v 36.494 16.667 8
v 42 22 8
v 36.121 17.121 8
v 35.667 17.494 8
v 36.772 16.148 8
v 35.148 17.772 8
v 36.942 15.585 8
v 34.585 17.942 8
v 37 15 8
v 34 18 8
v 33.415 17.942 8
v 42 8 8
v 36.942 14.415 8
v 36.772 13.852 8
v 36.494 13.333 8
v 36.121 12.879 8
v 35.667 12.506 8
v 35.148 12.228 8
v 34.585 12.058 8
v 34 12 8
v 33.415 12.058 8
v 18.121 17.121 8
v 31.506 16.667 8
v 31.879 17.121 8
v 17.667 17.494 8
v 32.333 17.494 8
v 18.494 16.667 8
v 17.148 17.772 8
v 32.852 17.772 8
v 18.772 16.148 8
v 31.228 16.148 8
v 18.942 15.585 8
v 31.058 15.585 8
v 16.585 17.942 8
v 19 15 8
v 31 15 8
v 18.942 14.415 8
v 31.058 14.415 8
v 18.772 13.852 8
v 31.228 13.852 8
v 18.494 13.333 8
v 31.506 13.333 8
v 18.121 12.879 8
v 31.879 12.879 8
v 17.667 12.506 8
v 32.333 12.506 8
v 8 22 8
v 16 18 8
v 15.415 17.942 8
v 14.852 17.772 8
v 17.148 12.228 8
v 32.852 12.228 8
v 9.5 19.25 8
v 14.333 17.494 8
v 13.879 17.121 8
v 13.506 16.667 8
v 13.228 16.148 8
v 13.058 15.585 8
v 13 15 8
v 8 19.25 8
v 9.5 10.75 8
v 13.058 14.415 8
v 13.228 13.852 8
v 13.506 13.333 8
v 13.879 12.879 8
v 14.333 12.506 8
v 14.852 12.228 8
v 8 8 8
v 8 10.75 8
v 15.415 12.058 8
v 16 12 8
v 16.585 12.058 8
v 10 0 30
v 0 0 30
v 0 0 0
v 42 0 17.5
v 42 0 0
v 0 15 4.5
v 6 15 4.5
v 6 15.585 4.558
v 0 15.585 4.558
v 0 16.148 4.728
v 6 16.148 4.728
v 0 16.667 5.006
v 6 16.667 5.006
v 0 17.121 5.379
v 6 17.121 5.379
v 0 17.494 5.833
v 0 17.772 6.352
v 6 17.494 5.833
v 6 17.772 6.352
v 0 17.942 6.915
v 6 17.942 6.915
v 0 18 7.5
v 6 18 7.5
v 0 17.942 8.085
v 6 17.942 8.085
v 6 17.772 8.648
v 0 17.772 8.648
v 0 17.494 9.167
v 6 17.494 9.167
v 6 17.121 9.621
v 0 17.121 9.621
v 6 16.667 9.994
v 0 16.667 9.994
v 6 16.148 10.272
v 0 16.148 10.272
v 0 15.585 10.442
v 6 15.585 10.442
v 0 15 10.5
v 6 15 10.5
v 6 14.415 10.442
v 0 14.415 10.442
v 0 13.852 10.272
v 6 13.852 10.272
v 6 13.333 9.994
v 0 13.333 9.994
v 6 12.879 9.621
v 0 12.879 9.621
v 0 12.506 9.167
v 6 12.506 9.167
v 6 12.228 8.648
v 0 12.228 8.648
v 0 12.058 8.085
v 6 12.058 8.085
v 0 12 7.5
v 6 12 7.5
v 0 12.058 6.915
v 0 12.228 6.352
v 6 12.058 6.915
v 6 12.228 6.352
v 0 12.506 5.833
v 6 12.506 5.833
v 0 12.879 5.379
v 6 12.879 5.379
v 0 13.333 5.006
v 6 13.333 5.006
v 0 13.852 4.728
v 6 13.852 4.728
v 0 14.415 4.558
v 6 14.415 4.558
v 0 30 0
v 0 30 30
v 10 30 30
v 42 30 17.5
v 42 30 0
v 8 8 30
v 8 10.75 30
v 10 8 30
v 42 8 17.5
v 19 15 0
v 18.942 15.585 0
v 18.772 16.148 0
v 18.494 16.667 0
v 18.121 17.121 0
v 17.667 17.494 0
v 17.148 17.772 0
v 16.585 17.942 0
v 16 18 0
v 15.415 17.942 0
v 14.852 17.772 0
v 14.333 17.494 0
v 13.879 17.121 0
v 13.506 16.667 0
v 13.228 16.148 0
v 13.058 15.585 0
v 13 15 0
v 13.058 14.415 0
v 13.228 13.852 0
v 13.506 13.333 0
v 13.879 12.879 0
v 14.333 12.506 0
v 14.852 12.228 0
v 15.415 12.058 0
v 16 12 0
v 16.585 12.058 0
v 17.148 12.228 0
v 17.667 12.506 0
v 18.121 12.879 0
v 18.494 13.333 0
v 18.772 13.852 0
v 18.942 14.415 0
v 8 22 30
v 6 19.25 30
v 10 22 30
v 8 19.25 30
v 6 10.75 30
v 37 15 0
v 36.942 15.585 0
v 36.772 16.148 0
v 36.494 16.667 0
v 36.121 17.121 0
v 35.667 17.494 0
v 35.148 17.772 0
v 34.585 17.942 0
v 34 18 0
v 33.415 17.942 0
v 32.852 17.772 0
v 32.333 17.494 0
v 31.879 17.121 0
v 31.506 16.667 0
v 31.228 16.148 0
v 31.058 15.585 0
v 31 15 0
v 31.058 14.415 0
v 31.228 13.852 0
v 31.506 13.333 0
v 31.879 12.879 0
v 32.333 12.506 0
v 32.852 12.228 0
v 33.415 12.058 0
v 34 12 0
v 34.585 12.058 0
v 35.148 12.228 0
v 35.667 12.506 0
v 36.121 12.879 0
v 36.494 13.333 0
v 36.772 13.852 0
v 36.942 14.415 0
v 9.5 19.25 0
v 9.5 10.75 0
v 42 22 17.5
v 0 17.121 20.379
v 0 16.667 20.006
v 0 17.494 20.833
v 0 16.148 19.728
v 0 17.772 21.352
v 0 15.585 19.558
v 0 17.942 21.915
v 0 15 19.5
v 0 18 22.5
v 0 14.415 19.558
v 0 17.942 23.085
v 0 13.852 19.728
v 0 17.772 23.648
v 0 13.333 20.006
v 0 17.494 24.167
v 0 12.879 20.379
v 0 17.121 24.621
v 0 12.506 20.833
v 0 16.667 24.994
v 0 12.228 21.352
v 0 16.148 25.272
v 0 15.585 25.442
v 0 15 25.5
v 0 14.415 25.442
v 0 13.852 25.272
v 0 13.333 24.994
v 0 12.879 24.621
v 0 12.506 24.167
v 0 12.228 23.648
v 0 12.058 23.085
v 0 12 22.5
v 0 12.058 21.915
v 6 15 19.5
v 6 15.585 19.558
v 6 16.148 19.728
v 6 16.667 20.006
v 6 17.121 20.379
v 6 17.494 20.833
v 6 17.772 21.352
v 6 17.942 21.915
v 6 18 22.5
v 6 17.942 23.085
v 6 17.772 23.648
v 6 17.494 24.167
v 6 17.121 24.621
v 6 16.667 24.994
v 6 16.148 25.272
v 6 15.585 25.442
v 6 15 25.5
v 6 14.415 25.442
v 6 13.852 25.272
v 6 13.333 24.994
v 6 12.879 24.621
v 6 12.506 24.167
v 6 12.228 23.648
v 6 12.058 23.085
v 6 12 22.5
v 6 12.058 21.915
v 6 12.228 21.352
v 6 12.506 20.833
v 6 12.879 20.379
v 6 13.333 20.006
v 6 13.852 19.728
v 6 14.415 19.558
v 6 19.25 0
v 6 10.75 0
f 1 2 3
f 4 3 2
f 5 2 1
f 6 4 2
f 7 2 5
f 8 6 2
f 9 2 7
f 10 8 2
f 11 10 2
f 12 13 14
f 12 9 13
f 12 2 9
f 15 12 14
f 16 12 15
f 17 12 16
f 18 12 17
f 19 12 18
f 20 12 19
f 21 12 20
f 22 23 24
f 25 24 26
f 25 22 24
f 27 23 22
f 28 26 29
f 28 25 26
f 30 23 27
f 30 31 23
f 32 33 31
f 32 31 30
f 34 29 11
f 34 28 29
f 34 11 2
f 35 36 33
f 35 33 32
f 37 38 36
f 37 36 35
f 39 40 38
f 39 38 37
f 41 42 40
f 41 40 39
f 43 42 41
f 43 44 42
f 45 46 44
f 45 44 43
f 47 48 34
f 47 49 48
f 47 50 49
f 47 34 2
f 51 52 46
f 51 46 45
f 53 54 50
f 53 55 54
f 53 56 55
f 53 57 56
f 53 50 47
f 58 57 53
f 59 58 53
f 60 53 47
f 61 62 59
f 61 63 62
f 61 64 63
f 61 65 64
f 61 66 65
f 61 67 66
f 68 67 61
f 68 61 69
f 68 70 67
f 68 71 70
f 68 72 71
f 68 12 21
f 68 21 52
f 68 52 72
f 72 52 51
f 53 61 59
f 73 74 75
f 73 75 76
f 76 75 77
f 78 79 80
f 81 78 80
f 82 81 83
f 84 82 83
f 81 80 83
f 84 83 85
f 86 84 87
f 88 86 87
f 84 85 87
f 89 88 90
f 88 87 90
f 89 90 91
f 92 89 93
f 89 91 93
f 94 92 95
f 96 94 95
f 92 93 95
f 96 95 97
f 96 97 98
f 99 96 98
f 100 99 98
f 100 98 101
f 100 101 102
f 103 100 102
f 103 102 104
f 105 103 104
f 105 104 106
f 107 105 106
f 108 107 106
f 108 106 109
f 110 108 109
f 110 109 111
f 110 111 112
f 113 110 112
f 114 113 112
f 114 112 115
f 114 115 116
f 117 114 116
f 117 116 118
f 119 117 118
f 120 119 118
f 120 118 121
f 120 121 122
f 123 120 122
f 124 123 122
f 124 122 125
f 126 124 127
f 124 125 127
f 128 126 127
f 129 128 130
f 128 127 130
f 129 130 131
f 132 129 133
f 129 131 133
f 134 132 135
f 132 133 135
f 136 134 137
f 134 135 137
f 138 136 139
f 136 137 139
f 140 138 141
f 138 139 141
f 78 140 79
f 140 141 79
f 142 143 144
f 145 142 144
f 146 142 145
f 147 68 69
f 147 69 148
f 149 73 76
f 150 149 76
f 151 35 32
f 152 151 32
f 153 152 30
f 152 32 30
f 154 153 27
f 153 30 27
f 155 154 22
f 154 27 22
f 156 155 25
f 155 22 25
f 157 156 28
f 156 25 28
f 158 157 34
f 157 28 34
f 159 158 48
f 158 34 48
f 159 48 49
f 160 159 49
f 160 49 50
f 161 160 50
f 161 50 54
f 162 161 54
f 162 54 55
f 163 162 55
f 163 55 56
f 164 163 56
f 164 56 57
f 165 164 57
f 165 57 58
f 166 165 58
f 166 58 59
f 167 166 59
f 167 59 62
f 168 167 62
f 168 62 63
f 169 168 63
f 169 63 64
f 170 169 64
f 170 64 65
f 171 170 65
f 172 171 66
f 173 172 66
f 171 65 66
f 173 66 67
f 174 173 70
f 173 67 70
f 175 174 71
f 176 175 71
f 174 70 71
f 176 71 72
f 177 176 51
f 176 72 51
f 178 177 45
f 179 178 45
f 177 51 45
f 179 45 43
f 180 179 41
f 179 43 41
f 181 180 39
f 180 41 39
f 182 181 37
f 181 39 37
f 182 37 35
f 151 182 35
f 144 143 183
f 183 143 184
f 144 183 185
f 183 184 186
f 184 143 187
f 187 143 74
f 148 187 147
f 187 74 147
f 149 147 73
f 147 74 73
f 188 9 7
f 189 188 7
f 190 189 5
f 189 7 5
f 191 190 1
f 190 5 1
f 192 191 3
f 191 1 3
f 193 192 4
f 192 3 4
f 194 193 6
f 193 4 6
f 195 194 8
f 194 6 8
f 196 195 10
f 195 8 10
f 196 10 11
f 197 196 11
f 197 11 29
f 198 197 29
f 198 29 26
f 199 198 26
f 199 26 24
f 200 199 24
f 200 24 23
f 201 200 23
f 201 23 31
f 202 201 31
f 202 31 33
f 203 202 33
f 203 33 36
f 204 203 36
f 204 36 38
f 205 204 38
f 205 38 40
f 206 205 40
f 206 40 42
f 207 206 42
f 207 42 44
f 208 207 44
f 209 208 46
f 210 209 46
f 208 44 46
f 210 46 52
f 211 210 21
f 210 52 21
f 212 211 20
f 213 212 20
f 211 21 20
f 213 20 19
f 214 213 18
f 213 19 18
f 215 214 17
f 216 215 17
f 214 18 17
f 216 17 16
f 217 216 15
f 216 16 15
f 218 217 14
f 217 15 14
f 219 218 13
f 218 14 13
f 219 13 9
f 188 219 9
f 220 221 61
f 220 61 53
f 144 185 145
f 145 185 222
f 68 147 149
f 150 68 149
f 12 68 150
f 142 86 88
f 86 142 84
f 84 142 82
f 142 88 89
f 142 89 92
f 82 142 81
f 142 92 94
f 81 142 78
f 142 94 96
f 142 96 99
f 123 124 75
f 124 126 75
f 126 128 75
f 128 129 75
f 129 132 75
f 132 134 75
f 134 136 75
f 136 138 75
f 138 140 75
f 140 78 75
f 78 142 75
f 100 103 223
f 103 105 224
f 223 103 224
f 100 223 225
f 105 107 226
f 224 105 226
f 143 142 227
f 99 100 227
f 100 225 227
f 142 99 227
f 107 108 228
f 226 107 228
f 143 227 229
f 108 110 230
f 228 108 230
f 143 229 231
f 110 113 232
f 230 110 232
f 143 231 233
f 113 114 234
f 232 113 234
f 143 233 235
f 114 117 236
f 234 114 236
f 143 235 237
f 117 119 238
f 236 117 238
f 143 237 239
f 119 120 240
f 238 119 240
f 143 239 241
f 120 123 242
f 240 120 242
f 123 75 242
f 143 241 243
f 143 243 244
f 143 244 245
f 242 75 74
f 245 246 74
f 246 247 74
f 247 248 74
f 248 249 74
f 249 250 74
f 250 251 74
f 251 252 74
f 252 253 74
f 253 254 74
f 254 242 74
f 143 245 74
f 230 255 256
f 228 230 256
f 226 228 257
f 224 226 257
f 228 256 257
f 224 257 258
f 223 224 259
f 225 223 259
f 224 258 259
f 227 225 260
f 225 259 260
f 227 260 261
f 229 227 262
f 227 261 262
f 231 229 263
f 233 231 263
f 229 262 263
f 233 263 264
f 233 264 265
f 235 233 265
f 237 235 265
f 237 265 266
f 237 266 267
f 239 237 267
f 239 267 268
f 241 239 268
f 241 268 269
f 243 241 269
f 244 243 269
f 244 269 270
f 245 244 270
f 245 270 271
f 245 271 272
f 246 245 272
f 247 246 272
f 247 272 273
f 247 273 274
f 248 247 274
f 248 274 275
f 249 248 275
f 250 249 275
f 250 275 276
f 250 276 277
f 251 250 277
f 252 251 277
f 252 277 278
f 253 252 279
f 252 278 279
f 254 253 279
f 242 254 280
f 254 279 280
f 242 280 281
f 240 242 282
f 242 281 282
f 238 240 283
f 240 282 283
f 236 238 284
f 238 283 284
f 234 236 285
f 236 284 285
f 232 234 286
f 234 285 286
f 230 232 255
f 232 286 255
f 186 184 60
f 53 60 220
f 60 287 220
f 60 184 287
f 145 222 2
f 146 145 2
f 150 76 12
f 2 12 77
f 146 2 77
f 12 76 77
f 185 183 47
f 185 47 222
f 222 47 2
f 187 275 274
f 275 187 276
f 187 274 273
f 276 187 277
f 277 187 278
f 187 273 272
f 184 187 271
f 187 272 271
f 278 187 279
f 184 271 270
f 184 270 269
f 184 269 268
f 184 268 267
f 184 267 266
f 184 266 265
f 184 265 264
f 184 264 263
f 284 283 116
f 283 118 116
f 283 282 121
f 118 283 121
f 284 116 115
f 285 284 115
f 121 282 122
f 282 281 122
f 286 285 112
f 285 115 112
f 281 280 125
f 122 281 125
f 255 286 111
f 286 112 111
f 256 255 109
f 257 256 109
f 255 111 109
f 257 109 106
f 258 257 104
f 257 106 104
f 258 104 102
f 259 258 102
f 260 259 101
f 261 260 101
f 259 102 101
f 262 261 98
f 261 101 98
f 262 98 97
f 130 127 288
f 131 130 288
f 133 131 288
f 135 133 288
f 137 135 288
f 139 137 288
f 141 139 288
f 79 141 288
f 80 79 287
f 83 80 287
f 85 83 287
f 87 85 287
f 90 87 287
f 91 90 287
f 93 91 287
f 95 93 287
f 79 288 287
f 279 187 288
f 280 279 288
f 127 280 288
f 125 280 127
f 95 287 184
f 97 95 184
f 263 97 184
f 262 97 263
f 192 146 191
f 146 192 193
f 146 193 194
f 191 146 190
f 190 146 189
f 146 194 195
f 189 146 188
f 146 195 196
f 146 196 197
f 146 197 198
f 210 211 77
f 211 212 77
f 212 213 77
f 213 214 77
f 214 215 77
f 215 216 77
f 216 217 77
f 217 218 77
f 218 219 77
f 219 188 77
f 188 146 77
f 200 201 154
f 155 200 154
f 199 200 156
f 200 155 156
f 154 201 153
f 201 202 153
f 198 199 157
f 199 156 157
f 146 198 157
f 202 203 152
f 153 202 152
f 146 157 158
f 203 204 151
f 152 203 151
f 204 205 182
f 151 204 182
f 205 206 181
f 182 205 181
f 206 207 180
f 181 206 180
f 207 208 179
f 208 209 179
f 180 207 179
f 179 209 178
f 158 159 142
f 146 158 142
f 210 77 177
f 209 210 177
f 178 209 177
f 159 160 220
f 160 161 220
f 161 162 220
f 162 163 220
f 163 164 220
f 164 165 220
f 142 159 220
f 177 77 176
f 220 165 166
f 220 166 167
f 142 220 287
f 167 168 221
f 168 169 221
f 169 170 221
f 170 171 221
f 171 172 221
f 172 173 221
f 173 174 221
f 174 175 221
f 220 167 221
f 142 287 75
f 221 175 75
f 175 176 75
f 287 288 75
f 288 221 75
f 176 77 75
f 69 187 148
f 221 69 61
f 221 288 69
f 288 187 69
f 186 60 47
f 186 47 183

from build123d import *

# Parameters (mm, degrees)
BOSS_EXTRUDE1_DEPTH     = 30
SHELL1_T                = -8
SKETCH3_R               = 3
CUT_EXTRUDE1_DEPTH      = 30
SKETCH4_R               = 3
CUT_EXTRUDE2_DEPTH      = 10
CUT_EXTRUDE3_DEPTH      = 57.107040556
CUT_EXTRUDE3_DEPTH_BACK = 57.107040556
SKETCH8_W               = 3.5
SKETCH8_H               = 8.5


with BuildPart() as part:
    # Sketch2 → Boss-Extrude1 (new body)
    with BuildSketch(Plane(origin=(0, 0, 0), x_dir=(1, 0, 0), z_dir=(0, 1, 0))):
        Polygon((10, -30), (42, -17.5), (42, 0), (0, 0), (0, -30), align=None)
    extrude(amount=BOSS_EXTRUDE1_DEPTH)

    # Shell1
    shell1_openings = [part.faces().sort_by_distance(p)[0] for p in [
        (42, 15, 8.75),
        (26, 15, 23.75),
        (5, 15, 30),
    ]]
    offset(amount=SHELL1_T, openings=shell1_openings, kind=Kind.INTERSECTION)

    # Sketch3 → Cut-Extrude1 (cut)
    with BuildSketch(Plane(origin=(8, 0, 0), x_dir=(0, 0, -1), z_dir=(1, 0, 0))):
        with Locations((-22.5, 15)):
            Circle(SKETCH3_R)
        with Locations((-7.5, 15)):
            Circle(SKETCH3_R)
    extrude(amount=-CUT_EXTRUDE1_DEPTH, mode=Mode.SUBTRACT)

    # Sketch4 → Cut-Extrude2 (cut)
    with BuildSketch(Plane.XY.offset(8)):
        with Locations((16, 15)):
            Circle(SKETCH4_R)
        with Locations((34, 15)):
            Circle(SKETCH4_R)
    extrude(amount=-CUT_EXTRUDE2_DEPTH, mode=Mode.SUBTRACT)

    # Sketch8 → Cut-Extrude3 (cut, two sides: drawn at the far end of the back side and taken through both)
    with BuildSketch(Plane.XY.offset(8).offset(-CUT_EXTRUDE3_DEPTH_BACK)):
        with Locations((7.75, 15)):
            Rectangle(SKETCH8_W, SKETCH8_H)
    extrude(amount=CUT_EXTRUDE3_DEPTH + CUT_EXTRUDE3_DEPTH_BACK, mode=Mode.SUBTRACT)


solid = part.part
